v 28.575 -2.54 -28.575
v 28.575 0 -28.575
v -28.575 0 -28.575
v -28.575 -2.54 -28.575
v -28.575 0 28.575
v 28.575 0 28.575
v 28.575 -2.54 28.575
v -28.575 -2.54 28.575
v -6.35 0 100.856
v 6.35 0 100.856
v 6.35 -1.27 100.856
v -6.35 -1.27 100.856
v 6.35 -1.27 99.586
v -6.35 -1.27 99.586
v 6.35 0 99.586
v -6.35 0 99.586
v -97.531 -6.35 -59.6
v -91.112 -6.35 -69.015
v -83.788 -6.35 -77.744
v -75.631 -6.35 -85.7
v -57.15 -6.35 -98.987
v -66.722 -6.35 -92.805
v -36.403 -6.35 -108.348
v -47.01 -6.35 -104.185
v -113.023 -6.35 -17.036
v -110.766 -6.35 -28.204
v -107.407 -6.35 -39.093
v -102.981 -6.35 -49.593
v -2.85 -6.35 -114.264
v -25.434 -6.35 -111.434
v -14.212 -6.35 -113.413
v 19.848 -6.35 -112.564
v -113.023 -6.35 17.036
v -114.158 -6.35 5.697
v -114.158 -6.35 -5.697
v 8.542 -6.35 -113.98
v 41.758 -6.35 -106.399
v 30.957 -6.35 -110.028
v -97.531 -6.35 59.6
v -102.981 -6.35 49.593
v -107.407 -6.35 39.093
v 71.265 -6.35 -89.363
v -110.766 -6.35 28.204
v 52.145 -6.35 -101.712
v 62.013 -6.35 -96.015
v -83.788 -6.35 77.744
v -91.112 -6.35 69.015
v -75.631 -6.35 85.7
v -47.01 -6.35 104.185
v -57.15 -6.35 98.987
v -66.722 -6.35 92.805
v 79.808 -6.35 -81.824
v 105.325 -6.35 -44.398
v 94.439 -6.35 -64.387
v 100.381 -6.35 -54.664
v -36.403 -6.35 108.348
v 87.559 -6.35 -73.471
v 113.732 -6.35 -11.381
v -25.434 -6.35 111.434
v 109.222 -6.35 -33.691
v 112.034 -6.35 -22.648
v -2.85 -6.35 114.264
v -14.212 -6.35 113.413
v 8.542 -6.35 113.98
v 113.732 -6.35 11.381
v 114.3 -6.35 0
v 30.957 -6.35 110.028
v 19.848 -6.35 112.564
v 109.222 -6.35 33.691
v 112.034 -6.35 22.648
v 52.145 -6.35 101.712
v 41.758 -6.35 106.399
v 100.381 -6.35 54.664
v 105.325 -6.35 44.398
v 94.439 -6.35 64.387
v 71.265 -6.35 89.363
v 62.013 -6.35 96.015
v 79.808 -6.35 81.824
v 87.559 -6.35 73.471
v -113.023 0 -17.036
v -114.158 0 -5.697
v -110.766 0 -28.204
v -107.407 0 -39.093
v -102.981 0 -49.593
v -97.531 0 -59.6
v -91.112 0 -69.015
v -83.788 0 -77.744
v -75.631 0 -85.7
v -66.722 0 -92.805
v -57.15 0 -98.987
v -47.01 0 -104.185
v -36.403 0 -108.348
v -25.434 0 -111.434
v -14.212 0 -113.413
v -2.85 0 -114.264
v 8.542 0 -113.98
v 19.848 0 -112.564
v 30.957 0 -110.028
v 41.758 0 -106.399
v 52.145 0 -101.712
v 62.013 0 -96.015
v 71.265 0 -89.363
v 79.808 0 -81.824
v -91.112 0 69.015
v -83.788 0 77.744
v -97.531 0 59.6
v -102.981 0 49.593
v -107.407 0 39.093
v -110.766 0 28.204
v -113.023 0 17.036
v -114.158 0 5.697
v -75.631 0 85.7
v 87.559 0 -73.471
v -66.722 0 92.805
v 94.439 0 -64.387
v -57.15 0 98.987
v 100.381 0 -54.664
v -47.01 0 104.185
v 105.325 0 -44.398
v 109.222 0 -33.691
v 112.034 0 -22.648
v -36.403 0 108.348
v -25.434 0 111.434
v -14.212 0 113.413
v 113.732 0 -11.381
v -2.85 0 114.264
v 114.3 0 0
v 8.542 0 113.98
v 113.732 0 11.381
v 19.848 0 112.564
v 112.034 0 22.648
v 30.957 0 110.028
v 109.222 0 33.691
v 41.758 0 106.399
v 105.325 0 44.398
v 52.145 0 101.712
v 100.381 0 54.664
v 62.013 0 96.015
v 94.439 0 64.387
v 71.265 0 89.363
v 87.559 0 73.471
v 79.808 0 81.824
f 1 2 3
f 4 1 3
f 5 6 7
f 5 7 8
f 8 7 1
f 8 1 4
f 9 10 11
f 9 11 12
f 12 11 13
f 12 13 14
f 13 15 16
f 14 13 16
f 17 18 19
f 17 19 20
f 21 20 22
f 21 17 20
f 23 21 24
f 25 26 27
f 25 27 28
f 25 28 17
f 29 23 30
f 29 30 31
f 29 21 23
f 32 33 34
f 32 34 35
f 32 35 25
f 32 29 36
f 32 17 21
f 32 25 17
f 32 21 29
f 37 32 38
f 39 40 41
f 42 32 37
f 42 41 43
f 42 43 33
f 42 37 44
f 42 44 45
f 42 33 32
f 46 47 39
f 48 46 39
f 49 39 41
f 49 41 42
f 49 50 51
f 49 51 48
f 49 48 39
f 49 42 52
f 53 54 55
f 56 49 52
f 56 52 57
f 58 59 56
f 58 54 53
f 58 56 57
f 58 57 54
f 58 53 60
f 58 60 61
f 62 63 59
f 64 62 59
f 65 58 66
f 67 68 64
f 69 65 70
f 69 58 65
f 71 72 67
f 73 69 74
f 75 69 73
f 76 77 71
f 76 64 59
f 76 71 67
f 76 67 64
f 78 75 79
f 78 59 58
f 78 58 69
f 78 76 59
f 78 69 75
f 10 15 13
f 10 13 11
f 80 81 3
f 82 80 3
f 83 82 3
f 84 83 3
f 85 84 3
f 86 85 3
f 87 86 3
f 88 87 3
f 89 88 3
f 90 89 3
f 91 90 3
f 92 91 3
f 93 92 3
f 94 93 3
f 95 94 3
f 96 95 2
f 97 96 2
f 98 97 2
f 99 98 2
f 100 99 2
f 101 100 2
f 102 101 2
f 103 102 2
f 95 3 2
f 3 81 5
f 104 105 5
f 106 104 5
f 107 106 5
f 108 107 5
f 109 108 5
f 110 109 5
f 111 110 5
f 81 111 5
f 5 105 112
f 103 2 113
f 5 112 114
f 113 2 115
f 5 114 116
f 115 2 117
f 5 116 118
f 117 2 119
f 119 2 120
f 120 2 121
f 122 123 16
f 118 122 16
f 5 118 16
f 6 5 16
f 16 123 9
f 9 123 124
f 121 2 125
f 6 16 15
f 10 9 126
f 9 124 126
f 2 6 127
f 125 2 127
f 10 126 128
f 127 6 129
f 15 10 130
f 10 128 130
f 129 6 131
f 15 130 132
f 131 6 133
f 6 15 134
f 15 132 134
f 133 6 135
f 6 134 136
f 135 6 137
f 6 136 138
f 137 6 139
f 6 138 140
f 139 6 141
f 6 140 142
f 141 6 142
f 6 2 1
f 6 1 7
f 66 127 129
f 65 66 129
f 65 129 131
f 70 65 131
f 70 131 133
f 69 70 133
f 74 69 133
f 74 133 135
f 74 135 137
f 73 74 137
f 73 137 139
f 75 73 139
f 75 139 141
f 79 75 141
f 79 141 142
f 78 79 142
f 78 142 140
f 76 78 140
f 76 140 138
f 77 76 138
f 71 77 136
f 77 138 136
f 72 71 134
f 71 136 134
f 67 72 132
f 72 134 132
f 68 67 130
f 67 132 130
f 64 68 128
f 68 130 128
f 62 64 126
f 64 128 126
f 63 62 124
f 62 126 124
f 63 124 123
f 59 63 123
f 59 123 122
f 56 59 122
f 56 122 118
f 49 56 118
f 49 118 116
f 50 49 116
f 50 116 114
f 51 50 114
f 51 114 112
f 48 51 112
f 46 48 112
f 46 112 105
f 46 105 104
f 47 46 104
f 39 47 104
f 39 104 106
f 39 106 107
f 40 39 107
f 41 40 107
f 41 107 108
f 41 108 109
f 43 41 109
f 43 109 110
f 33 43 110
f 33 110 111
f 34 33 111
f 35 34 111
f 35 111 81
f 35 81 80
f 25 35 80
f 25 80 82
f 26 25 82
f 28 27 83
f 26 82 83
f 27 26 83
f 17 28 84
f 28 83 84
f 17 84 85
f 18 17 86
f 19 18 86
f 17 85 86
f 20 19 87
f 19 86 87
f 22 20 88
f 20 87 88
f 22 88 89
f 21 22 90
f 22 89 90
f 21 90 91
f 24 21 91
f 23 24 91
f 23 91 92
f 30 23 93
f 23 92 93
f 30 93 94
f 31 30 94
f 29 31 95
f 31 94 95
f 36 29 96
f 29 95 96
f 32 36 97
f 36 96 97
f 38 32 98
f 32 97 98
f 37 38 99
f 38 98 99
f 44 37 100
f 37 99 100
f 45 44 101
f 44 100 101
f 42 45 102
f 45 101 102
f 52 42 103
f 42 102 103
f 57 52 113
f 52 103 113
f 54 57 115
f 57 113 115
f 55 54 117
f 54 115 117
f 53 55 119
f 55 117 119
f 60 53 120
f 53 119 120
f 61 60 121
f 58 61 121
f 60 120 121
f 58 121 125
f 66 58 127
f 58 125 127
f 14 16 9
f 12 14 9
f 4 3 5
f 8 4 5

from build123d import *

# Parameters (mm, degrees)
F0_R     = 114.3
F1_DEPTH = 25.4
F2_DEPTH = 12.7
F3_DEPTH = 6.35
F4_W     = 57.15
F4_H     = 57.15
F5_DEPTH = 2.54
F6_W     = 12.7
F6_H     = 1.27
F7_DEPTH = 1.27


with BuildPart() as f1:
    # F0 (on Front) → F1 (new body)
    with BuildSketch(Plane.XZ):
        Circle(F0_R)
    extrude(amount=F1_DEPTH)

    # F2 (cut): a face of the model
    f2_faces = [f1.faces().sort_by_distance(p)[0] for p in [
        (0, -25.4, 0),
    ]]
    extrude(f2_faces, amount=-F2_DEPTH, mode=Mode.SUBTRACT)

    # F3 (cut): a face of the model
    f3_faces = [f1.faces().sort_by_distance(p)[0] for p in [
        (0, -12.7, 0),
    ]]
    extrude(f3_faces, amount=-F3_DEPTH, mode=Mode.SUBTRACT)

    # F4 (on face) → F5 (cut)
    with BuildSketch(Plane(origin=(0, 0, 0), x_dir=(-1, 0, 0), z_dir=(0, 1, 0))):
        Rectangle(F4_W, F4_H)
    extrude(amount=-F5_DEPTH, mode=Mode.SUBTRACT)

    # F6 (on face) → F7 (cut)
    with BuildSketch(Plane(origin=(0, 0, 0), x_dir=(-1, 0, 0), z_dir=(0, 1, 0))):
        with Locations((0, 100.2205033398)):
            Rectangle(F6_W, F6_H)
    extrude(amount=-F7_DEPTH, mode=Mode.SUBTRACT)


solid = f1.part
